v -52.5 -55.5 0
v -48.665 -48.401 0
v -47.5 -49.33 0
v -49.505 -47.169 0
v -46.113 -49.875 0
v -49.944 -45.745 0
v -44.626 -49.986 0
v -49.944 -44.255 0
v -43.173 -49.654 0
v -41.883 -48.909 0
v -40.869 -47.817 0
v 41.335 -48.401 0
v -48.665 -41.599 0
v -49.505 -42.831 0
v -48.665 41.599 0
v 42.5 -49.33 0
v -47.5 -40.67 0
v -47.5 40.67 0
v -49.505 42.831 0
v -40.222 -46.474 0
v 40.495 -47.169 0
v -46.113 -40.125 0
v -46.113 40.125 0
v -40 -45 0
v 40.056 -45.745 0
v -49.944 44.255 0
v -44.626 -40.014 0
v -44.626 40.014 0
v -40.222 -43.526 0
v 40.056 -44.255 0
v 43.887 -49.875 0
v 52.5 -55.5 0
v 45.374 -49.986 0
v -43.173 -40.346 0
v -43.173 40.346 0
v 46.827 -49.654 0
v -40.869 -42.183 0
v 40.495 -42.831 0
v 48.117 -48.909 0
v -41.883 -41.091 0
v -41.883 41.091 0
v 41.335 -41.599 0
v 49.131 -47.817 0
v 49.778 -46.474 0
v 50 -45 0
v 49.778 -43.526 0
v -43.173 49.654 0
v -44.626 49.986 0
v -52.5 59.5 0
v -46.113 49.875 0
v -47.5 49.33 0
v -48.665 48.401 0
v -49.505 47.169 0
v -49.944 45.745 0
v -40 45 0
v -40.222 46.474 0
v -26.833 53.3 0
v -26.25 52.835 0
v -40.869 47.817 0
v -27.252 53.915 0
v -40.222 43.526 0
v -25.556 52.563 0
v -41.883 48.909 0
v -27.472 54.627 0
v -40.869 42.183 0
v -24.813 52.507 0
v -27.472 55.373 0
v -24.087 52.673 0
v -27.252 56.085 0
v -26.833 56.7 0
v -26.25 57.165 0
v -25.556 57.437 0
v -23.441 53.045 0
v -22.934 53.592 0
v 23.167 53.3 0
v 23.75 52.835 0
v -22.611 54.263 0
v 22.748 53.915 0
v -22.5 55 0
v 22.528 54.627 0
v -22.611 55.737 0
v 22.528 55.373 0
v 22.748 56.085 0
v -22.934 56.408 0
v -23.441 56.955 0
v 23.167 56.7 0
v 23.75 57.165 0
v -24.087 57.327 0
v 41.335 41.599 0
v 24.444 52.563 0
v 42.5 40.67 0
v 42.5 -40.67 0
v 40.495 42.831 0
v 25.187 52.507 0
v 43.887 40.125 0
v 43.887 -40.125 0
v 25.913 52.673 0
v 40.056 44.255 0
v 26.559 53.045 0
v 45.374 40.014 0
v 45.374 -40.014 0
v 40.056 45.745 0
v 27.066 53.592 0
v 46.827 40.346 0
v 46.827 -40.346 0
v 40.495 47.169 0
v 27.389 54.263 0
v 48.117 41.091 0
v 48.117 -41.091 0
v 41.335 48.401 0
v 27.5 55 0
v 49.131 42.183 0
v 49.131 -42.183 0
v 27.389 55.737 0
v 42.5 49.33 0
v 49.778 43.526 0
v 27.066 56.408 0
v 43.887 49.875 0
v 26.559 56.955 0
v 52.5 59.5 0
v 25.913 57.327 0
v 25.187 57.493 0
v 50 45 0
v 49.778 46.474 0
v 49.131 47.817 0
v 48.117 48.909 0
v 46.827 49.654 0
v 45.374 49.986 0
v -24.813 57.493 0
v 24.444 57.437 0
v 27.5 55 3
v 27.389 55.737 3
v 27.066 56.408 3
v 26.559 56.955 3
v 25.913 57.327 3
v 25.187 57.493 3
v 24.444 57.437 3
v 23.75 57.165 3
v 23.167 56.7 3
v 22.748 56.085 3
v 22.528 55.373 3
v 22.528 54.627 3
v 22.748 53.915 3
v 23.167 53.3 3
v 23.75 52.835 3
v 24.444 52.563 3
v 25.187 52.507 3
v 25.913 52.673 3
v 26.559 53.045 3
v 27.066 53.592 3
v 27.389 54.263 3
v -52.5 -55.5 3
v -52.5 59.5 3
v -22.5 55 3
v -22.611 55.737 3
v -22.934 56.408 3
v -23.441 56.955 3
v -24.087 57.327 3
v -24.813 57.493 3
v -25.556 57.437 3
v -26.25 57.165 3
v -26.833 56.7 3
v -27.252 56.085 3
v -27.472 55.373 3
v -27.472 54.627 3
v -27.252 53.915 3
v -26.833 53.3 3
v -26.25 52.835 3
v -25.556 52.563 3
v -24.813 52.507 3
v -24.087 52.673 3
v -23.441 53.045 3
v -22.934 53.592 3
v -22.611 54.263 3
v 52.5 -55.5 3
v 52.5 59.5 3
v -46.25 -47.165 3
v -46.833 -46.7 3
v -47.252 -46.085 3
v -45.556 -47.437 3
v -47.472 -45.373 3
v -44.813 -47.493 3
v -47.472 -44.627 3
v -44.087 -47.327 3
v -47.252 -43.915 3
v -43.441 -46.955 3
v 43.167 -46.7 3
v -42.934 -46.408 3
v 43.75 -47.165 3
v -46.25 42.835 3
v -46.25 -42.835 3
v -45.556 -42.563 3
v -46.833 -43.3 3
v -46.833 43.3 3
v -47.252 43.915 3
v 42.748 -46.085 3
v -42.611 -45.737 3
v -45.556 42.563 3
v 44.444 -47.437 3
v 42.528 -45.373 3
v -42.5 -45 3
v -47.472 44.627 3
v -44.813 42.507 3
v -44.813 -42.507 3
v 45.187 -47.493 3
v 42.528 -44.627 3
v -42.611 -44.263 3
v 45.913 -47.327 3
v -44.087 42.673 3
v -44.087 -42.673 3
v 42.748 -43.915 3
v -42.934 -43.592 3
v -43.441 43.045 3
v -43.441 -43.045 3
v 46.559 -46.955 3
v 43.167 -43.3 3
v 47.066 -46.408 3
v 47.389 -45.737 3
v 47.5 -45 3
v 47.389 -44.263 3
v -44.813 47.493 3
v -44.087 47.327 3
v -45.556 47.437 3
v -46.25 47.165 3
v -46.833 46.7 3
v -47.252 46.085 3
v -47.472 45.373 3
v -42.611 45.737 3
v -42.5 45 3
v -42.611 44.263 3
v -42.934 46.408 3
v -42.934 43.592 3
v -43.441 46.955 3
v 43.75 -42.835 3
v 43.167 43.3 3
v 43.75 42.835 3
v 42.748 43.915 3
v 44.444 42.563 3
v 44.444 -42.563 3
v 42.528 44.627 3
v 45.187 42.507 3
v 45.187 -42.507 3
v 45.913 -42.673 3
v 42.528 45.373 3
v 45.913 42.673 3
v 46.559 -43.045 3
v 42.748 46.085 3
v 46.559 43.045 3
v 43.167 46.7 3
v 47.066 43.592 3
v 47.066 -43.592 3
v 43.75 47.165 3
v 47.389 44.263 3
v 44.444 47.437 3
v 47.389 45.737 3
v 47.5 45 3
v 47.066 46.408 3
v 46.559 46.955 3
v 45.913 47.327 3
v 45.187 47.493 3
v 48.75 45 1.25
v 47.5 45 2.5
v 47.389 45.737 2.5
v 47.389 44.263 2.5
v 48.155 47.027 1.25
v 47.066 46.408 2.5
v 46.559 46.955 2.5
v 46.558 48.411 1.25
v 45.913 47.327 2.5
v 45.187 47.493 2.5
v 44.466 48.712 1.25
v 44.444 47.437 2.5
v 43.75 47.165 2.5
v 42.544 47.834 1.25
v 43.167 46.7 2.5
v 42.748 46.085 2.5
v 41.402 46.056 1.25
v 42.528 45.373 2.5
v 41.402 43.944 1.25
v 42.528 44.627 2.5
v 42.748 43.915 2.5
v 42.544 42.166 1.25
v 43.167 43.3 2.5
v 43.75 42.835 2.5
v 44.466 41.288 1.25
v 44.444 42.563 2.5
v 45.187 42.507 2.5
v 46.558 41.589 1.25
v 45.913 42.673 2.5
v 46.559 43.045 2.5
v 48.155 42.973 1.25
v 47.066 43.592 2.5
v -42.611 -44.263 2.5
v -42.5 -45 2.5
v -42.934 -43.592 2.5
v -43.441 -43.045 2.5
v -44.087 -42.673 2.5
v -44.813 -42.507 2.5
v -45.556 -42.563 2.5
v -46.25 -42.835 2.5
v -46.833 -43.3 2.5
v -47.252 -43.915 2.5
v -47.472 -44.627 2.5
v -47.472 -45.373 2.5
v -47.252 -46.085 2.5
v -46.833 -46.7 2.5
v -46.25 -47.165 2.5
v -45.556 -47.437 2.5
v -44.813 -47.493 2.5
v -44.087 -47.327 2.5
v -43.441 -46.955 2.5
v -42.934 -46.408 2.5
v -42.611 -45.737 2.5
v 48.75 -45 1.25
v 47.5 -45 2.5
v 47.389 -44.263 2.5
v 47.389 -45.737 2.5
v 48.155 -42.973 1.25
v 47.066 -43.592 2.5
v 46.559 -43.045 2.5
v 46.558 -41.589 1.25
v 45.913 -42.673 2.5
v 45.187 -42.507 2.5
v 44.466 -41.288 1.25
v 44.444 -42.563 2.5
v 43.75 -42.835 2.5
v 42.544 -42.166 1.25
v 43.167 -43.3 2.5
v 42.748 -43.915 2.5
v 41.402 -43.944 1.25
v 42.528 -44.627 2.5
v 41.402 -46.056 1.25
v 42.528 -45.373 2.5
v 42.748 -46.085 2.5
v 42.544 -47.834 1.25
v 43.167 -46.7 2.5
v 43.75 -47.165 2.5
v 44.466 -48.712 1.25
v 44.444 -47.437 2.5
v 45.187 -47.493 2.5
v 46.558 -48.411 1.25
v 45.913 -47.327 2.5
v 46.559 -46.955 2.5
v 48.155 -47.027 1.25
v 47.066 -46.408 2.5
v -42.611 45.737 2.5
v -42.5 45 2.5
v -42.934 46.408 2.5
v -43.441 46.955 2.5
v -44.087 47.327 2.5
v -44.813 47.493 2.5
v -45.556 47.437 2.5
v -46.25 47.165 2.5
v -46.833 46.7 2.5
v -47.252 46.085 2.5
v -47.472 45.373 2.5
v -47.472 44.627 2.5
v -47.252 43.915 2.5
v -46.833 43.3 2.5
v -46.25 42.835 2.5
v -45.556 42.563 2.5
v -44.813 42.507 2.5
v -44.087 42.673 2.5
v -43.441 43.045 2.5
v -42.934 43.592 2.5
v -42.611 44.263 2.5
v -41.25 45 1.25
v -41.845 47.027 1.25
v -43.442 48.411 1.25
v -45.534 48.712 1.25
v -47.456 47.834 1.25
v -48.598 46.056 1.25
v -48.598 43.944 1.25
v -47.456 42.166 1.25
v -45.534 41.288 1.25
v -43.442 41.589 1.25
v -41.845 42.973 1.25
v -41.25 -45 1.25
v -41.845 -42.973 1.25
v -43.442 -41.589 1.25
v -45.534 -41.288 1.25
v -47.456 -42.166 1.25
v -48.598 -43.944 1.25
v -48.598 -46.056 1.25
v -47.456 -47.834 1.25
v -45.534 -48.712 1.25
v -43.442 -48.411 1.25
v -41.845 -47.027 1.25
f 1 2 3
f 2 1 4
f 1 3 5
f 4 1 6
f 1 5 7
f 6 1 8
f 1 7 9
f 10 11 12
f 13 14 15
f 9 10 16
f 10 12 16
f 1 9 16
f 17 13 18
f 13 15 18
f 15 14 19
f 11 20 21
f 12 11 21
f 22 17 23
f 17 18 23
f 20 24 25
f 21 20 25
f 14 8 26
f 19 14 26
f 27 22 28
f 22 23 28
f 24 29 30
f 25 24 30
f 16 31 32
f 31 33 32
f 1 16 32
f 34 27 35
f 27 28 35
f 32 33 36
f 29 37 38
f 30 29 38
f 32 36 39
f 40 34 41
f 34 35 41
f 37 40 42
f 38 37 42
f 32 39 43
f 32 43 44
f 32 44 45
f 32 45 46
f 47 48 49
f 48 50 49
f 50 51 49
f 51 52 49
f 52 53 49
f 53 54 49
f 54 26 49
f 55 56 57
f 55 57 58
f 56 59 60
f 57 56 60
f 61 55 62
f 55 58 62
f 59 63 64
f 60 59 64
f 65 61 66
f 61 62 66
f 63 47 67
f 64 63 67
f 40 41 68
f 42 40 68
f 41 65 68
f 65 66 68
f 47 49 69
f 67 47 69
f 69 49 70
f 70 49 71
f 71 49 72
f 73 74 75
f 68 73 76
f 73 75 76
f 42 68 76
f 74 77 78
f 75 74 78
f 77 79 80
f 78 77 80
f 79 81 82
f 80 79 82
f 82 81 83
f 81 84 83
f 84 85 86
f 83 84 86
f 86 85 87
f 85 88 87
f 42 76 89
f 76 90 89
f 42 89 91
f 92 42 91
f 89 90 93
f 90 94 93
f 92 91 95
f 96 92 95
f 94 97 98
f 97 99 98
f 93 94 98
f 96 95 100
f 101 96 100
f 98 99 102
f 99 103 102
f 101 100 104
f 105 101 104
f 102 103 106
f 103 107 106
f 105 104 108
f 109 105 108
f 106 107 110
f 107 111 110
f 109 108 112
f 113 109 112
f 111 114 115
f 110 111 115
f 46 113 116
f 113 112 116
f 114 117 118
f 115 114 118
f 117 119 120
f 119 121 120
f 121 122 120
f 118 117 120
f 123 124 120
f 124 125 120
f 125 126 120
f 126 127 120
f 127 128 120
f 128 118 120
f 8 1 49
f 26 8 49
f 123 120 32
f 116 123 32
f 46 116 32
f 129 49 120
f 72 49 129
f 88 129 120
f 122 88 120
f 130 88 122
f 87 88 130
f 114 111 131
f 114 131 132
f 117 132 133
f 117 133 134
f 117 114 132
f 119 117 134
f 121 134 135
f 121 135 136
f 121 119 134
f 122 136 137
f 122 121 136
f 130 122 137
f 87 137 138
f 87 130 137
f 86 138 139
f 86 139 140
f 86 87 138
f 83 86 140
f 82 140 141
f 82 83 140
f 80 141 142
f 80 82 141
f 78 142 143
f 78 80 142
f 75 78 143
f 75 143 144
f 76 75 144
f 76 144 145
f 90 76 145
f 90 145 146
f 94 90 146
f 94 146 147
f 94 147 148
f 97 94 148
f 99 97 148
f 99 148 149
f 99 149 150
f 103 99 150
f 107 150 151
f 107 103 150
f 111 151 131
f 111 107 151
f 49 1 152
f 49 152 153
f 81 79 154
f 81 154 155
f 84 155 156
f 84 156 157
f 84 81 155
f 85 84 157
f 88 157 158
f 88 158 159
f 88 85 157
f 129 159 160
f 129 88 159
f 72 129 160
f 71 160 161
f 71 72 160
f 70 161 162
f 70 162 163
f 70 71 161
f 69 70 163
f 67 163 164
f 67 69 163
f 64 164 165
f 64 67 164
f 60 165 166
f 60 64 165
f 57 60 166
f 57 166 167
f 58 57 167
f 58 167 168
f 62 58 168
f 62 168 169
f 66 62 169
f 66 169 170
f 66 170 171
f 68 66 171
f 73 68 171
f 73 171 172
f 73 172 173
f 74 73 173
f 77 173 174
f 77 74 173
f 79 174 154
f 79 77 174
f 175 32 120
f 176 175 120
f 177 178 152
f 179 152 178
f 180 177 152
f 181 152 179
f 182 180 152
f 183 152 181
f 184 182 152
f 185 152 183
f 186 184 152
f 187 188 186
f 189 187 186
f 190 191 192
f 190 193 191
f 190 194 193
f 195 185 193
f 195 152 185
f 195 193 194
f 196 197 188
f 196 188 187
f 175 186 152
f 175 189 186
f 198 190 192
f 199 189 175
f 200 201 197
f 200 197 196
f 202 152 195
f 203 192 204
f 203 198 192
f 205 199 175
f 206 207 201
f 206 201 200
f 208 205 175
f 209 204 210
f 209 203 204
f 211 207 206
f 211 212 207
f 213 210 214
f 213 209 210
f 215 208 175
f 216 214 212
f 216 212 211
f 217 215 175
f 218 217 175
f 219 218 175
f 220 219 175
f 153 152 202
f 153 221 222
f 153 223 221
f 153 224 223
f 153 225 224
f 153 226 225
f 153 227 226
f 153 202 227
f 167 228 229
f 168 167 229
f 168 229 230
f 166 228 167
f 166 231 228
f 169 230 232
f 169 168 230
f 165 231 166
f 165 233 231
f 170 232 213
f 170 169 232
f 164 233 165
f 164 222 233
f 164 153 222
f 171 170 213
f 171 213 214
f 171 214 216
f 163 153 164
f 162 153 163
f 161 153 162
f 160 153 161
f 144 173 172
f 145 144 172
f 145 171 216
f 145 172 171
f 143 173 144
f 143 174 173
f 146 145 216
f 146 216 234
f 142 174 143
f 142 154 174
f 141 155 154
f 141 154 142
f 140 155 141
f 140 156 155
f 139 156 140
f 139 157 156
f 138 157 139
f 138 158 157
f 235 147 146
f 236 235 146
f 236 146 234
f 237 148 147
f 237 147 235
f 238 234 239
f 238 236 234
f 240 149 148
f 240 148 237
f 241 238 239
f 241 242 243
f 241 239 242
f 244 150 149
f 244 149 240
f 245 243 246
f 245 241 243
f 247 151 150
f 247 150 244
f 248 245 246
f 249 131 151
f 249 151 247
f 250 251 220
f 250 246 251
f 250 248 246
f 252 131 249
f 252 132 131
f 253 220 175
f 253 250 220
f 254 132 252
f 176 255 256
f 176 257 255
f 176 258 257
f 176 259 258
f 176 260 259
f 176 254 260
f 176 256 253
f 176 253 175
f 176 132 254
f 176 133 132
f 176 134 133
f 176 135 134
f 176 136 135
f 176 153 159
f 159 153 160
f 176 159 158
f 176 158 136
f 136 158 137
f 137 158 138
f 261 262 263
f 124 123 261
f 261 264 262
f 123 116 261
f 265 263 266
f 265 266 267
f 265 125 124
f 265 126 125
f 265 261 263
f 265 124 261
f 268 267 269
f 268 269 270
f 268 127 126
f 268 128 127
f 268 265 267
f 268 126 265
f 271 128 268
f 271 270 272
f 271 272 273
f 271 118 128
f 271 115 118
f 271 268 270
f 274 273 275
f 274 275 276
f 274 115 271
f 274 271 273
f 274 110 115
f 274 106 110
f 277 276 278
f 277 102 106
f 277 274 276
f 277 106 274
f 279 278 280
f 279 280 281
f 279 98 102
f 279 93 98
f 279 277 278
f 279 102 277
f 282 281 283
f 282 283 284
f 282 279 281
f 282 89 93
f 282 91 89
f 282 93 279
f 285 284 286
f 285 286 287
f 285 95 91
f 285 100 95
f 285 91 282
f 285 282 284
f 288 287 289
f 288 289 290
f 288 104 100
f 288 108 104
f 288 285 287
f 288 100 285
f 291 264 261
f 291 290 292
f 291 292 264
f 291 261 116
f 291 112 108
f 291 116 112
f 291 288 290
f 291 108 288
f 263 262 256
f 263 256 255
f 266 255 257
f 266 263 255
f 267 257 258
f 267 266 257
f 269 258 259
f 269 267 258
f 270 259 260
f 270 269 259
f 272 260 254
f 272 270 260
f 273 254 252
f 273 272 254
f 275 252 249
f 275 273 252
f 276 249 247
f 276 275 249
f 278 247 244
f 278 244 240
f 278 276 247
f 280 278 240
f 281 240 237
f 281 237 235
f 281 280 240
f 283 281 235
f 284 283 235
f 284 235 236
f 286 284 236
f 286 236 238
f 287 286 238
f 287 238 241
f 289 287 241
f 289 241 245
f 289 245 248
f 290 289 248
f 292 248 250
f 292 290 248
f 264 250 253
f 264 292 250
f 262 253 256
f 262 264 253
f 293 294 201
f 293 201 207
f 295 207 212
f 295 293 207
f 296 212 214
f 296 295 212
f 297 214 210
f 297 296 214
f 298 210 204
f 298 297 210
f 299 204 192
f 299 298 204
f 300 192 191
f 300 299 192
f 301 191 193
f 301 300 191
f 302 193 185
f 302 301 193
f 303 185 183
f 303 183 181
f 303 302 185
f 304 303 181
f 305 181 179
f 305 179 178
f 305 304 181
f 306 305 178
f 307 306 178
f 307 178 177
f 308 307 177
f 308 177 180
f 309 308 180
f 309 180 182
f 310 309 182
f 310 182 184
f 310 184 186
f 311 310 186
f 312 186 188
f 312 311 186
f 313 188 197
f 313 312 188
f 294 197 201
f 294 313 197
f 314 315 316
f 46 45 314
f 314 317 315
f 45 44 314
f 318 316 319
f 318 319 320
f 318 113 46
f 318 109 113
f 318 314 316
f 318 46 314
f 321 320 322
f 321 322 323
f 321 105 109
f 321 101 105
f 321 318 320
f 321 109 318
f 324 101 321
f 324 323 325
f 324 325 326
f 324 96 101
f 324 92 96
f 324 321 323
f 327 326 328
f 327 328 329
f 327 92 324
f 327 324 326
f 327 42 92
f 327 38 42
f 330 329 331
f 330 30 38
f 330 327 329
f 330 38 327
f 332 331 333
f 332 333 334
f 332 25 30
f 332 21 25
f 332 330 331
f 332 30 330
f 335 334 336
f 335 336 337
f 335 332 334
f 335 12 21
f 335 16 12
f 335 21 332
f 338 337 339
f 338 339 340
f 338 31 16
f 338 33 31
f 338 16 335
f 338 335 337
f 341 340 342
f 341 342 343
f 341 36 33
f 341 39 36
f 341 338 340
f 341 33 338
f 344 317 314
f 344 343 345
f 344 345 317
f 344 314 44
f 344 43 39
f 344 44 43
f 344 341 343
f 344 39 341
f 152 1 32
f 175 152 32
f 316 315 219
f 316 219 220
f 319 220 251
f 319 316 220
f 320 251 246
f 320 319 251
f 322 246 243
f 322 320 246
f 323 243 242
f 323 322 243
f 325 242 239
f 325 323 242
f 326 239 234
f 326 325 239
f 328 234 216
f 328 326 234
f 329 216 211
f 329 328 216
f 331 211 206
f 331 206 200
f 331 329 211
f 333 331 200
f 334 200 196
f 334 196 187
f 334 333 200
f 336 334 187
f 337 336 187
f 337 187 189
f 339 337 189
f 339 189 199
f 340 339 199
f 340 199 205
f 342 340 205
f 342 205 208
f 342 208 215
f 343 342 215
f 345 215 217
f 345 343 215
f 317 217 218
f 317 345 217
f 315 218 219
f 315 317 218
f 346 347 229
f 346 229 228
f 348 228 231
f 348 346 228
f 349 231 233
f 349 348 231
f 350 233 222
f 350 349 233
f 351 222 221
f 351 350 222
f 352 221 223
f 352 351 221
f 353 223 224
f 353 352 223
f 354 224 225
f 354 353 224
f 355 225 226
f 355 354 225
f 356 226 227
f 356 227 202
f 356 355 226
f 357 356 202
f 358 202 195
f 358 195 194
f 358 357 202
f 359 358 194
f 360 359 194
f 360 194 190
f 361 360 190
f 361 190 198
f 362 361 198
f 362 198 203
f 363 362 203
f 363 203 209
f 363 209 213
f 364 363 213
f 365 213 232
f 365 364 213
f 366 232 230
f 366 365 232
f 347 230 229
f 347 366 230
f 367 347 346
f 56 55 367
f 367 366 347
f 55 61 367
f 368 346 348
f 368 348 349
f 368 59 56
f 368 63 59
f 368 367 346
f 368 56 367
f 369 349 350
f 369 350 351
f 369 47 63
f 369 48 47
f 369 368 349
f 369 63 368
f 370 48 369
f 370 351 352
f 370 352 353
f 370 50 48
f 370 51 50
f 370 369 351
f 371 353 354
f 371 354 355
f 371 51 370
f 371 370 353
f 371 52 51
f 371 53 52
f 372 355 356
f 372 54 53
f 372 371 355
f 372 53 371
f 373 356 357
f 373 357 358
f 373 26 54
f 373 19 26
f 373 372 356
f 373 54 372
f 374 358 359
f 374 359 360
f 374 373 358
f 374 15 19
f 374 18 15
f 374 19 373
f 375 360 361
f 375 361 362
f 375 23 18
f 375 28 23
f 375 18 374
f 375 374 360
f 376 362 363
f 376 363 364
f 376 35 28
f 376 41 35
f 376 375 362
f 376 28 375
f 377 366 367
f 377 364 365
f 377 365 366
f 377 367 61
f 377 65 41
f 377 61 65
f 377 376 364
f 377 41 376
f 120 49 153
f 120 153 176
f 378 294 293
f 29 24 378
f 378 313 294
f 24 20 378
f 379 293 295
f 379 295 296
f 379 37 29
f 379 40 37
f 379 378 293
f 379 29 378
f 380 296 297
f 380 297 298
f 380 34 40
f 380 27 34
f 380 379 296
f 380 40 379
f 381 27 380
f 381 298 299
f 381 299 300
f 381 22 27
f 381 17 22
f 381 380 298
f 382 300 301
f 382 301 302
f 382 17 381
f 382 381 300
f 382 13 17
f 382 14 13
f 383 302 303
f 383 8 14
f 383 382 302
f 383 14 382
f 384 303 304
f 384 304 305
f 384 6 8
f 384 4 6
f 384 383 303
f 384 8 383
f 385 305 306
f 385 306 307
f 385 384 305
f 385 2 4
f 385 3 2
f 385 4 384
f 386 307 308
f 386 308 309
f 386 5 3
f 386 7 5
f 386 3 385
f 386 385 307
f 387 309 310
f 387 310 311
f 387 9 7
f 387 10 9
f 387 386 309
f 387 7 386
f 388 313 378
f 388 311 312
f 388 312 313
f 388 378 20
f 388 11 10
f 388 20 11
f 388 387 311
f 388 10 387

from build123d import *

# Parameters (mm, degrees)
F0_W     = 105
F0_H     = 115
F0_R     = 2.5
F1_DEPTH = 3
F2_SIZE2 = 2.5
F2_SIZE  = 2.5


with BuildPart() as f1:
    # F0 (on Top) → F1 (new body)
    with BuildSketch(Plane.XY):
        with Locations((0, 2)):
            Rectangle(F0_W, F0_H)
        with Locations((-45, -45)):
            Circle(F0_R, mode=Mode.SUBTRACT)
        with Locations((45, -45)):
            Circle(F0_R, mode=Mode.SUBTRACT)
        with Locations((-45, 45)):
            Circle(F0_R, mode=Mode.SUBTRACT)
        with Locations((-25, 55)):
            Circle(F0_R, mode=Mode.SUBTRACT)
        with Locations((25, 55)):
            Circle(F0_R, mode=Mode.SUBTRACT)
        with Locations((45, 45)):
            Circle(F0_R, mode=Mode.SUBTRACT)
    extrude(amount=F1_DEPTH)

    # F2
    f2_edges = [f1.edges().sort_by_distance(p)[0] for p in [
        (-47.5, -45, 0),
        (42.5, -45, 0),
        (42.5, 45, 0),
        (-47.5, 45, 0),
    ]]
    chamfer(f2_edges, length=F2_SIZE, length2=F2_SIZE2)


solid = f1.part
